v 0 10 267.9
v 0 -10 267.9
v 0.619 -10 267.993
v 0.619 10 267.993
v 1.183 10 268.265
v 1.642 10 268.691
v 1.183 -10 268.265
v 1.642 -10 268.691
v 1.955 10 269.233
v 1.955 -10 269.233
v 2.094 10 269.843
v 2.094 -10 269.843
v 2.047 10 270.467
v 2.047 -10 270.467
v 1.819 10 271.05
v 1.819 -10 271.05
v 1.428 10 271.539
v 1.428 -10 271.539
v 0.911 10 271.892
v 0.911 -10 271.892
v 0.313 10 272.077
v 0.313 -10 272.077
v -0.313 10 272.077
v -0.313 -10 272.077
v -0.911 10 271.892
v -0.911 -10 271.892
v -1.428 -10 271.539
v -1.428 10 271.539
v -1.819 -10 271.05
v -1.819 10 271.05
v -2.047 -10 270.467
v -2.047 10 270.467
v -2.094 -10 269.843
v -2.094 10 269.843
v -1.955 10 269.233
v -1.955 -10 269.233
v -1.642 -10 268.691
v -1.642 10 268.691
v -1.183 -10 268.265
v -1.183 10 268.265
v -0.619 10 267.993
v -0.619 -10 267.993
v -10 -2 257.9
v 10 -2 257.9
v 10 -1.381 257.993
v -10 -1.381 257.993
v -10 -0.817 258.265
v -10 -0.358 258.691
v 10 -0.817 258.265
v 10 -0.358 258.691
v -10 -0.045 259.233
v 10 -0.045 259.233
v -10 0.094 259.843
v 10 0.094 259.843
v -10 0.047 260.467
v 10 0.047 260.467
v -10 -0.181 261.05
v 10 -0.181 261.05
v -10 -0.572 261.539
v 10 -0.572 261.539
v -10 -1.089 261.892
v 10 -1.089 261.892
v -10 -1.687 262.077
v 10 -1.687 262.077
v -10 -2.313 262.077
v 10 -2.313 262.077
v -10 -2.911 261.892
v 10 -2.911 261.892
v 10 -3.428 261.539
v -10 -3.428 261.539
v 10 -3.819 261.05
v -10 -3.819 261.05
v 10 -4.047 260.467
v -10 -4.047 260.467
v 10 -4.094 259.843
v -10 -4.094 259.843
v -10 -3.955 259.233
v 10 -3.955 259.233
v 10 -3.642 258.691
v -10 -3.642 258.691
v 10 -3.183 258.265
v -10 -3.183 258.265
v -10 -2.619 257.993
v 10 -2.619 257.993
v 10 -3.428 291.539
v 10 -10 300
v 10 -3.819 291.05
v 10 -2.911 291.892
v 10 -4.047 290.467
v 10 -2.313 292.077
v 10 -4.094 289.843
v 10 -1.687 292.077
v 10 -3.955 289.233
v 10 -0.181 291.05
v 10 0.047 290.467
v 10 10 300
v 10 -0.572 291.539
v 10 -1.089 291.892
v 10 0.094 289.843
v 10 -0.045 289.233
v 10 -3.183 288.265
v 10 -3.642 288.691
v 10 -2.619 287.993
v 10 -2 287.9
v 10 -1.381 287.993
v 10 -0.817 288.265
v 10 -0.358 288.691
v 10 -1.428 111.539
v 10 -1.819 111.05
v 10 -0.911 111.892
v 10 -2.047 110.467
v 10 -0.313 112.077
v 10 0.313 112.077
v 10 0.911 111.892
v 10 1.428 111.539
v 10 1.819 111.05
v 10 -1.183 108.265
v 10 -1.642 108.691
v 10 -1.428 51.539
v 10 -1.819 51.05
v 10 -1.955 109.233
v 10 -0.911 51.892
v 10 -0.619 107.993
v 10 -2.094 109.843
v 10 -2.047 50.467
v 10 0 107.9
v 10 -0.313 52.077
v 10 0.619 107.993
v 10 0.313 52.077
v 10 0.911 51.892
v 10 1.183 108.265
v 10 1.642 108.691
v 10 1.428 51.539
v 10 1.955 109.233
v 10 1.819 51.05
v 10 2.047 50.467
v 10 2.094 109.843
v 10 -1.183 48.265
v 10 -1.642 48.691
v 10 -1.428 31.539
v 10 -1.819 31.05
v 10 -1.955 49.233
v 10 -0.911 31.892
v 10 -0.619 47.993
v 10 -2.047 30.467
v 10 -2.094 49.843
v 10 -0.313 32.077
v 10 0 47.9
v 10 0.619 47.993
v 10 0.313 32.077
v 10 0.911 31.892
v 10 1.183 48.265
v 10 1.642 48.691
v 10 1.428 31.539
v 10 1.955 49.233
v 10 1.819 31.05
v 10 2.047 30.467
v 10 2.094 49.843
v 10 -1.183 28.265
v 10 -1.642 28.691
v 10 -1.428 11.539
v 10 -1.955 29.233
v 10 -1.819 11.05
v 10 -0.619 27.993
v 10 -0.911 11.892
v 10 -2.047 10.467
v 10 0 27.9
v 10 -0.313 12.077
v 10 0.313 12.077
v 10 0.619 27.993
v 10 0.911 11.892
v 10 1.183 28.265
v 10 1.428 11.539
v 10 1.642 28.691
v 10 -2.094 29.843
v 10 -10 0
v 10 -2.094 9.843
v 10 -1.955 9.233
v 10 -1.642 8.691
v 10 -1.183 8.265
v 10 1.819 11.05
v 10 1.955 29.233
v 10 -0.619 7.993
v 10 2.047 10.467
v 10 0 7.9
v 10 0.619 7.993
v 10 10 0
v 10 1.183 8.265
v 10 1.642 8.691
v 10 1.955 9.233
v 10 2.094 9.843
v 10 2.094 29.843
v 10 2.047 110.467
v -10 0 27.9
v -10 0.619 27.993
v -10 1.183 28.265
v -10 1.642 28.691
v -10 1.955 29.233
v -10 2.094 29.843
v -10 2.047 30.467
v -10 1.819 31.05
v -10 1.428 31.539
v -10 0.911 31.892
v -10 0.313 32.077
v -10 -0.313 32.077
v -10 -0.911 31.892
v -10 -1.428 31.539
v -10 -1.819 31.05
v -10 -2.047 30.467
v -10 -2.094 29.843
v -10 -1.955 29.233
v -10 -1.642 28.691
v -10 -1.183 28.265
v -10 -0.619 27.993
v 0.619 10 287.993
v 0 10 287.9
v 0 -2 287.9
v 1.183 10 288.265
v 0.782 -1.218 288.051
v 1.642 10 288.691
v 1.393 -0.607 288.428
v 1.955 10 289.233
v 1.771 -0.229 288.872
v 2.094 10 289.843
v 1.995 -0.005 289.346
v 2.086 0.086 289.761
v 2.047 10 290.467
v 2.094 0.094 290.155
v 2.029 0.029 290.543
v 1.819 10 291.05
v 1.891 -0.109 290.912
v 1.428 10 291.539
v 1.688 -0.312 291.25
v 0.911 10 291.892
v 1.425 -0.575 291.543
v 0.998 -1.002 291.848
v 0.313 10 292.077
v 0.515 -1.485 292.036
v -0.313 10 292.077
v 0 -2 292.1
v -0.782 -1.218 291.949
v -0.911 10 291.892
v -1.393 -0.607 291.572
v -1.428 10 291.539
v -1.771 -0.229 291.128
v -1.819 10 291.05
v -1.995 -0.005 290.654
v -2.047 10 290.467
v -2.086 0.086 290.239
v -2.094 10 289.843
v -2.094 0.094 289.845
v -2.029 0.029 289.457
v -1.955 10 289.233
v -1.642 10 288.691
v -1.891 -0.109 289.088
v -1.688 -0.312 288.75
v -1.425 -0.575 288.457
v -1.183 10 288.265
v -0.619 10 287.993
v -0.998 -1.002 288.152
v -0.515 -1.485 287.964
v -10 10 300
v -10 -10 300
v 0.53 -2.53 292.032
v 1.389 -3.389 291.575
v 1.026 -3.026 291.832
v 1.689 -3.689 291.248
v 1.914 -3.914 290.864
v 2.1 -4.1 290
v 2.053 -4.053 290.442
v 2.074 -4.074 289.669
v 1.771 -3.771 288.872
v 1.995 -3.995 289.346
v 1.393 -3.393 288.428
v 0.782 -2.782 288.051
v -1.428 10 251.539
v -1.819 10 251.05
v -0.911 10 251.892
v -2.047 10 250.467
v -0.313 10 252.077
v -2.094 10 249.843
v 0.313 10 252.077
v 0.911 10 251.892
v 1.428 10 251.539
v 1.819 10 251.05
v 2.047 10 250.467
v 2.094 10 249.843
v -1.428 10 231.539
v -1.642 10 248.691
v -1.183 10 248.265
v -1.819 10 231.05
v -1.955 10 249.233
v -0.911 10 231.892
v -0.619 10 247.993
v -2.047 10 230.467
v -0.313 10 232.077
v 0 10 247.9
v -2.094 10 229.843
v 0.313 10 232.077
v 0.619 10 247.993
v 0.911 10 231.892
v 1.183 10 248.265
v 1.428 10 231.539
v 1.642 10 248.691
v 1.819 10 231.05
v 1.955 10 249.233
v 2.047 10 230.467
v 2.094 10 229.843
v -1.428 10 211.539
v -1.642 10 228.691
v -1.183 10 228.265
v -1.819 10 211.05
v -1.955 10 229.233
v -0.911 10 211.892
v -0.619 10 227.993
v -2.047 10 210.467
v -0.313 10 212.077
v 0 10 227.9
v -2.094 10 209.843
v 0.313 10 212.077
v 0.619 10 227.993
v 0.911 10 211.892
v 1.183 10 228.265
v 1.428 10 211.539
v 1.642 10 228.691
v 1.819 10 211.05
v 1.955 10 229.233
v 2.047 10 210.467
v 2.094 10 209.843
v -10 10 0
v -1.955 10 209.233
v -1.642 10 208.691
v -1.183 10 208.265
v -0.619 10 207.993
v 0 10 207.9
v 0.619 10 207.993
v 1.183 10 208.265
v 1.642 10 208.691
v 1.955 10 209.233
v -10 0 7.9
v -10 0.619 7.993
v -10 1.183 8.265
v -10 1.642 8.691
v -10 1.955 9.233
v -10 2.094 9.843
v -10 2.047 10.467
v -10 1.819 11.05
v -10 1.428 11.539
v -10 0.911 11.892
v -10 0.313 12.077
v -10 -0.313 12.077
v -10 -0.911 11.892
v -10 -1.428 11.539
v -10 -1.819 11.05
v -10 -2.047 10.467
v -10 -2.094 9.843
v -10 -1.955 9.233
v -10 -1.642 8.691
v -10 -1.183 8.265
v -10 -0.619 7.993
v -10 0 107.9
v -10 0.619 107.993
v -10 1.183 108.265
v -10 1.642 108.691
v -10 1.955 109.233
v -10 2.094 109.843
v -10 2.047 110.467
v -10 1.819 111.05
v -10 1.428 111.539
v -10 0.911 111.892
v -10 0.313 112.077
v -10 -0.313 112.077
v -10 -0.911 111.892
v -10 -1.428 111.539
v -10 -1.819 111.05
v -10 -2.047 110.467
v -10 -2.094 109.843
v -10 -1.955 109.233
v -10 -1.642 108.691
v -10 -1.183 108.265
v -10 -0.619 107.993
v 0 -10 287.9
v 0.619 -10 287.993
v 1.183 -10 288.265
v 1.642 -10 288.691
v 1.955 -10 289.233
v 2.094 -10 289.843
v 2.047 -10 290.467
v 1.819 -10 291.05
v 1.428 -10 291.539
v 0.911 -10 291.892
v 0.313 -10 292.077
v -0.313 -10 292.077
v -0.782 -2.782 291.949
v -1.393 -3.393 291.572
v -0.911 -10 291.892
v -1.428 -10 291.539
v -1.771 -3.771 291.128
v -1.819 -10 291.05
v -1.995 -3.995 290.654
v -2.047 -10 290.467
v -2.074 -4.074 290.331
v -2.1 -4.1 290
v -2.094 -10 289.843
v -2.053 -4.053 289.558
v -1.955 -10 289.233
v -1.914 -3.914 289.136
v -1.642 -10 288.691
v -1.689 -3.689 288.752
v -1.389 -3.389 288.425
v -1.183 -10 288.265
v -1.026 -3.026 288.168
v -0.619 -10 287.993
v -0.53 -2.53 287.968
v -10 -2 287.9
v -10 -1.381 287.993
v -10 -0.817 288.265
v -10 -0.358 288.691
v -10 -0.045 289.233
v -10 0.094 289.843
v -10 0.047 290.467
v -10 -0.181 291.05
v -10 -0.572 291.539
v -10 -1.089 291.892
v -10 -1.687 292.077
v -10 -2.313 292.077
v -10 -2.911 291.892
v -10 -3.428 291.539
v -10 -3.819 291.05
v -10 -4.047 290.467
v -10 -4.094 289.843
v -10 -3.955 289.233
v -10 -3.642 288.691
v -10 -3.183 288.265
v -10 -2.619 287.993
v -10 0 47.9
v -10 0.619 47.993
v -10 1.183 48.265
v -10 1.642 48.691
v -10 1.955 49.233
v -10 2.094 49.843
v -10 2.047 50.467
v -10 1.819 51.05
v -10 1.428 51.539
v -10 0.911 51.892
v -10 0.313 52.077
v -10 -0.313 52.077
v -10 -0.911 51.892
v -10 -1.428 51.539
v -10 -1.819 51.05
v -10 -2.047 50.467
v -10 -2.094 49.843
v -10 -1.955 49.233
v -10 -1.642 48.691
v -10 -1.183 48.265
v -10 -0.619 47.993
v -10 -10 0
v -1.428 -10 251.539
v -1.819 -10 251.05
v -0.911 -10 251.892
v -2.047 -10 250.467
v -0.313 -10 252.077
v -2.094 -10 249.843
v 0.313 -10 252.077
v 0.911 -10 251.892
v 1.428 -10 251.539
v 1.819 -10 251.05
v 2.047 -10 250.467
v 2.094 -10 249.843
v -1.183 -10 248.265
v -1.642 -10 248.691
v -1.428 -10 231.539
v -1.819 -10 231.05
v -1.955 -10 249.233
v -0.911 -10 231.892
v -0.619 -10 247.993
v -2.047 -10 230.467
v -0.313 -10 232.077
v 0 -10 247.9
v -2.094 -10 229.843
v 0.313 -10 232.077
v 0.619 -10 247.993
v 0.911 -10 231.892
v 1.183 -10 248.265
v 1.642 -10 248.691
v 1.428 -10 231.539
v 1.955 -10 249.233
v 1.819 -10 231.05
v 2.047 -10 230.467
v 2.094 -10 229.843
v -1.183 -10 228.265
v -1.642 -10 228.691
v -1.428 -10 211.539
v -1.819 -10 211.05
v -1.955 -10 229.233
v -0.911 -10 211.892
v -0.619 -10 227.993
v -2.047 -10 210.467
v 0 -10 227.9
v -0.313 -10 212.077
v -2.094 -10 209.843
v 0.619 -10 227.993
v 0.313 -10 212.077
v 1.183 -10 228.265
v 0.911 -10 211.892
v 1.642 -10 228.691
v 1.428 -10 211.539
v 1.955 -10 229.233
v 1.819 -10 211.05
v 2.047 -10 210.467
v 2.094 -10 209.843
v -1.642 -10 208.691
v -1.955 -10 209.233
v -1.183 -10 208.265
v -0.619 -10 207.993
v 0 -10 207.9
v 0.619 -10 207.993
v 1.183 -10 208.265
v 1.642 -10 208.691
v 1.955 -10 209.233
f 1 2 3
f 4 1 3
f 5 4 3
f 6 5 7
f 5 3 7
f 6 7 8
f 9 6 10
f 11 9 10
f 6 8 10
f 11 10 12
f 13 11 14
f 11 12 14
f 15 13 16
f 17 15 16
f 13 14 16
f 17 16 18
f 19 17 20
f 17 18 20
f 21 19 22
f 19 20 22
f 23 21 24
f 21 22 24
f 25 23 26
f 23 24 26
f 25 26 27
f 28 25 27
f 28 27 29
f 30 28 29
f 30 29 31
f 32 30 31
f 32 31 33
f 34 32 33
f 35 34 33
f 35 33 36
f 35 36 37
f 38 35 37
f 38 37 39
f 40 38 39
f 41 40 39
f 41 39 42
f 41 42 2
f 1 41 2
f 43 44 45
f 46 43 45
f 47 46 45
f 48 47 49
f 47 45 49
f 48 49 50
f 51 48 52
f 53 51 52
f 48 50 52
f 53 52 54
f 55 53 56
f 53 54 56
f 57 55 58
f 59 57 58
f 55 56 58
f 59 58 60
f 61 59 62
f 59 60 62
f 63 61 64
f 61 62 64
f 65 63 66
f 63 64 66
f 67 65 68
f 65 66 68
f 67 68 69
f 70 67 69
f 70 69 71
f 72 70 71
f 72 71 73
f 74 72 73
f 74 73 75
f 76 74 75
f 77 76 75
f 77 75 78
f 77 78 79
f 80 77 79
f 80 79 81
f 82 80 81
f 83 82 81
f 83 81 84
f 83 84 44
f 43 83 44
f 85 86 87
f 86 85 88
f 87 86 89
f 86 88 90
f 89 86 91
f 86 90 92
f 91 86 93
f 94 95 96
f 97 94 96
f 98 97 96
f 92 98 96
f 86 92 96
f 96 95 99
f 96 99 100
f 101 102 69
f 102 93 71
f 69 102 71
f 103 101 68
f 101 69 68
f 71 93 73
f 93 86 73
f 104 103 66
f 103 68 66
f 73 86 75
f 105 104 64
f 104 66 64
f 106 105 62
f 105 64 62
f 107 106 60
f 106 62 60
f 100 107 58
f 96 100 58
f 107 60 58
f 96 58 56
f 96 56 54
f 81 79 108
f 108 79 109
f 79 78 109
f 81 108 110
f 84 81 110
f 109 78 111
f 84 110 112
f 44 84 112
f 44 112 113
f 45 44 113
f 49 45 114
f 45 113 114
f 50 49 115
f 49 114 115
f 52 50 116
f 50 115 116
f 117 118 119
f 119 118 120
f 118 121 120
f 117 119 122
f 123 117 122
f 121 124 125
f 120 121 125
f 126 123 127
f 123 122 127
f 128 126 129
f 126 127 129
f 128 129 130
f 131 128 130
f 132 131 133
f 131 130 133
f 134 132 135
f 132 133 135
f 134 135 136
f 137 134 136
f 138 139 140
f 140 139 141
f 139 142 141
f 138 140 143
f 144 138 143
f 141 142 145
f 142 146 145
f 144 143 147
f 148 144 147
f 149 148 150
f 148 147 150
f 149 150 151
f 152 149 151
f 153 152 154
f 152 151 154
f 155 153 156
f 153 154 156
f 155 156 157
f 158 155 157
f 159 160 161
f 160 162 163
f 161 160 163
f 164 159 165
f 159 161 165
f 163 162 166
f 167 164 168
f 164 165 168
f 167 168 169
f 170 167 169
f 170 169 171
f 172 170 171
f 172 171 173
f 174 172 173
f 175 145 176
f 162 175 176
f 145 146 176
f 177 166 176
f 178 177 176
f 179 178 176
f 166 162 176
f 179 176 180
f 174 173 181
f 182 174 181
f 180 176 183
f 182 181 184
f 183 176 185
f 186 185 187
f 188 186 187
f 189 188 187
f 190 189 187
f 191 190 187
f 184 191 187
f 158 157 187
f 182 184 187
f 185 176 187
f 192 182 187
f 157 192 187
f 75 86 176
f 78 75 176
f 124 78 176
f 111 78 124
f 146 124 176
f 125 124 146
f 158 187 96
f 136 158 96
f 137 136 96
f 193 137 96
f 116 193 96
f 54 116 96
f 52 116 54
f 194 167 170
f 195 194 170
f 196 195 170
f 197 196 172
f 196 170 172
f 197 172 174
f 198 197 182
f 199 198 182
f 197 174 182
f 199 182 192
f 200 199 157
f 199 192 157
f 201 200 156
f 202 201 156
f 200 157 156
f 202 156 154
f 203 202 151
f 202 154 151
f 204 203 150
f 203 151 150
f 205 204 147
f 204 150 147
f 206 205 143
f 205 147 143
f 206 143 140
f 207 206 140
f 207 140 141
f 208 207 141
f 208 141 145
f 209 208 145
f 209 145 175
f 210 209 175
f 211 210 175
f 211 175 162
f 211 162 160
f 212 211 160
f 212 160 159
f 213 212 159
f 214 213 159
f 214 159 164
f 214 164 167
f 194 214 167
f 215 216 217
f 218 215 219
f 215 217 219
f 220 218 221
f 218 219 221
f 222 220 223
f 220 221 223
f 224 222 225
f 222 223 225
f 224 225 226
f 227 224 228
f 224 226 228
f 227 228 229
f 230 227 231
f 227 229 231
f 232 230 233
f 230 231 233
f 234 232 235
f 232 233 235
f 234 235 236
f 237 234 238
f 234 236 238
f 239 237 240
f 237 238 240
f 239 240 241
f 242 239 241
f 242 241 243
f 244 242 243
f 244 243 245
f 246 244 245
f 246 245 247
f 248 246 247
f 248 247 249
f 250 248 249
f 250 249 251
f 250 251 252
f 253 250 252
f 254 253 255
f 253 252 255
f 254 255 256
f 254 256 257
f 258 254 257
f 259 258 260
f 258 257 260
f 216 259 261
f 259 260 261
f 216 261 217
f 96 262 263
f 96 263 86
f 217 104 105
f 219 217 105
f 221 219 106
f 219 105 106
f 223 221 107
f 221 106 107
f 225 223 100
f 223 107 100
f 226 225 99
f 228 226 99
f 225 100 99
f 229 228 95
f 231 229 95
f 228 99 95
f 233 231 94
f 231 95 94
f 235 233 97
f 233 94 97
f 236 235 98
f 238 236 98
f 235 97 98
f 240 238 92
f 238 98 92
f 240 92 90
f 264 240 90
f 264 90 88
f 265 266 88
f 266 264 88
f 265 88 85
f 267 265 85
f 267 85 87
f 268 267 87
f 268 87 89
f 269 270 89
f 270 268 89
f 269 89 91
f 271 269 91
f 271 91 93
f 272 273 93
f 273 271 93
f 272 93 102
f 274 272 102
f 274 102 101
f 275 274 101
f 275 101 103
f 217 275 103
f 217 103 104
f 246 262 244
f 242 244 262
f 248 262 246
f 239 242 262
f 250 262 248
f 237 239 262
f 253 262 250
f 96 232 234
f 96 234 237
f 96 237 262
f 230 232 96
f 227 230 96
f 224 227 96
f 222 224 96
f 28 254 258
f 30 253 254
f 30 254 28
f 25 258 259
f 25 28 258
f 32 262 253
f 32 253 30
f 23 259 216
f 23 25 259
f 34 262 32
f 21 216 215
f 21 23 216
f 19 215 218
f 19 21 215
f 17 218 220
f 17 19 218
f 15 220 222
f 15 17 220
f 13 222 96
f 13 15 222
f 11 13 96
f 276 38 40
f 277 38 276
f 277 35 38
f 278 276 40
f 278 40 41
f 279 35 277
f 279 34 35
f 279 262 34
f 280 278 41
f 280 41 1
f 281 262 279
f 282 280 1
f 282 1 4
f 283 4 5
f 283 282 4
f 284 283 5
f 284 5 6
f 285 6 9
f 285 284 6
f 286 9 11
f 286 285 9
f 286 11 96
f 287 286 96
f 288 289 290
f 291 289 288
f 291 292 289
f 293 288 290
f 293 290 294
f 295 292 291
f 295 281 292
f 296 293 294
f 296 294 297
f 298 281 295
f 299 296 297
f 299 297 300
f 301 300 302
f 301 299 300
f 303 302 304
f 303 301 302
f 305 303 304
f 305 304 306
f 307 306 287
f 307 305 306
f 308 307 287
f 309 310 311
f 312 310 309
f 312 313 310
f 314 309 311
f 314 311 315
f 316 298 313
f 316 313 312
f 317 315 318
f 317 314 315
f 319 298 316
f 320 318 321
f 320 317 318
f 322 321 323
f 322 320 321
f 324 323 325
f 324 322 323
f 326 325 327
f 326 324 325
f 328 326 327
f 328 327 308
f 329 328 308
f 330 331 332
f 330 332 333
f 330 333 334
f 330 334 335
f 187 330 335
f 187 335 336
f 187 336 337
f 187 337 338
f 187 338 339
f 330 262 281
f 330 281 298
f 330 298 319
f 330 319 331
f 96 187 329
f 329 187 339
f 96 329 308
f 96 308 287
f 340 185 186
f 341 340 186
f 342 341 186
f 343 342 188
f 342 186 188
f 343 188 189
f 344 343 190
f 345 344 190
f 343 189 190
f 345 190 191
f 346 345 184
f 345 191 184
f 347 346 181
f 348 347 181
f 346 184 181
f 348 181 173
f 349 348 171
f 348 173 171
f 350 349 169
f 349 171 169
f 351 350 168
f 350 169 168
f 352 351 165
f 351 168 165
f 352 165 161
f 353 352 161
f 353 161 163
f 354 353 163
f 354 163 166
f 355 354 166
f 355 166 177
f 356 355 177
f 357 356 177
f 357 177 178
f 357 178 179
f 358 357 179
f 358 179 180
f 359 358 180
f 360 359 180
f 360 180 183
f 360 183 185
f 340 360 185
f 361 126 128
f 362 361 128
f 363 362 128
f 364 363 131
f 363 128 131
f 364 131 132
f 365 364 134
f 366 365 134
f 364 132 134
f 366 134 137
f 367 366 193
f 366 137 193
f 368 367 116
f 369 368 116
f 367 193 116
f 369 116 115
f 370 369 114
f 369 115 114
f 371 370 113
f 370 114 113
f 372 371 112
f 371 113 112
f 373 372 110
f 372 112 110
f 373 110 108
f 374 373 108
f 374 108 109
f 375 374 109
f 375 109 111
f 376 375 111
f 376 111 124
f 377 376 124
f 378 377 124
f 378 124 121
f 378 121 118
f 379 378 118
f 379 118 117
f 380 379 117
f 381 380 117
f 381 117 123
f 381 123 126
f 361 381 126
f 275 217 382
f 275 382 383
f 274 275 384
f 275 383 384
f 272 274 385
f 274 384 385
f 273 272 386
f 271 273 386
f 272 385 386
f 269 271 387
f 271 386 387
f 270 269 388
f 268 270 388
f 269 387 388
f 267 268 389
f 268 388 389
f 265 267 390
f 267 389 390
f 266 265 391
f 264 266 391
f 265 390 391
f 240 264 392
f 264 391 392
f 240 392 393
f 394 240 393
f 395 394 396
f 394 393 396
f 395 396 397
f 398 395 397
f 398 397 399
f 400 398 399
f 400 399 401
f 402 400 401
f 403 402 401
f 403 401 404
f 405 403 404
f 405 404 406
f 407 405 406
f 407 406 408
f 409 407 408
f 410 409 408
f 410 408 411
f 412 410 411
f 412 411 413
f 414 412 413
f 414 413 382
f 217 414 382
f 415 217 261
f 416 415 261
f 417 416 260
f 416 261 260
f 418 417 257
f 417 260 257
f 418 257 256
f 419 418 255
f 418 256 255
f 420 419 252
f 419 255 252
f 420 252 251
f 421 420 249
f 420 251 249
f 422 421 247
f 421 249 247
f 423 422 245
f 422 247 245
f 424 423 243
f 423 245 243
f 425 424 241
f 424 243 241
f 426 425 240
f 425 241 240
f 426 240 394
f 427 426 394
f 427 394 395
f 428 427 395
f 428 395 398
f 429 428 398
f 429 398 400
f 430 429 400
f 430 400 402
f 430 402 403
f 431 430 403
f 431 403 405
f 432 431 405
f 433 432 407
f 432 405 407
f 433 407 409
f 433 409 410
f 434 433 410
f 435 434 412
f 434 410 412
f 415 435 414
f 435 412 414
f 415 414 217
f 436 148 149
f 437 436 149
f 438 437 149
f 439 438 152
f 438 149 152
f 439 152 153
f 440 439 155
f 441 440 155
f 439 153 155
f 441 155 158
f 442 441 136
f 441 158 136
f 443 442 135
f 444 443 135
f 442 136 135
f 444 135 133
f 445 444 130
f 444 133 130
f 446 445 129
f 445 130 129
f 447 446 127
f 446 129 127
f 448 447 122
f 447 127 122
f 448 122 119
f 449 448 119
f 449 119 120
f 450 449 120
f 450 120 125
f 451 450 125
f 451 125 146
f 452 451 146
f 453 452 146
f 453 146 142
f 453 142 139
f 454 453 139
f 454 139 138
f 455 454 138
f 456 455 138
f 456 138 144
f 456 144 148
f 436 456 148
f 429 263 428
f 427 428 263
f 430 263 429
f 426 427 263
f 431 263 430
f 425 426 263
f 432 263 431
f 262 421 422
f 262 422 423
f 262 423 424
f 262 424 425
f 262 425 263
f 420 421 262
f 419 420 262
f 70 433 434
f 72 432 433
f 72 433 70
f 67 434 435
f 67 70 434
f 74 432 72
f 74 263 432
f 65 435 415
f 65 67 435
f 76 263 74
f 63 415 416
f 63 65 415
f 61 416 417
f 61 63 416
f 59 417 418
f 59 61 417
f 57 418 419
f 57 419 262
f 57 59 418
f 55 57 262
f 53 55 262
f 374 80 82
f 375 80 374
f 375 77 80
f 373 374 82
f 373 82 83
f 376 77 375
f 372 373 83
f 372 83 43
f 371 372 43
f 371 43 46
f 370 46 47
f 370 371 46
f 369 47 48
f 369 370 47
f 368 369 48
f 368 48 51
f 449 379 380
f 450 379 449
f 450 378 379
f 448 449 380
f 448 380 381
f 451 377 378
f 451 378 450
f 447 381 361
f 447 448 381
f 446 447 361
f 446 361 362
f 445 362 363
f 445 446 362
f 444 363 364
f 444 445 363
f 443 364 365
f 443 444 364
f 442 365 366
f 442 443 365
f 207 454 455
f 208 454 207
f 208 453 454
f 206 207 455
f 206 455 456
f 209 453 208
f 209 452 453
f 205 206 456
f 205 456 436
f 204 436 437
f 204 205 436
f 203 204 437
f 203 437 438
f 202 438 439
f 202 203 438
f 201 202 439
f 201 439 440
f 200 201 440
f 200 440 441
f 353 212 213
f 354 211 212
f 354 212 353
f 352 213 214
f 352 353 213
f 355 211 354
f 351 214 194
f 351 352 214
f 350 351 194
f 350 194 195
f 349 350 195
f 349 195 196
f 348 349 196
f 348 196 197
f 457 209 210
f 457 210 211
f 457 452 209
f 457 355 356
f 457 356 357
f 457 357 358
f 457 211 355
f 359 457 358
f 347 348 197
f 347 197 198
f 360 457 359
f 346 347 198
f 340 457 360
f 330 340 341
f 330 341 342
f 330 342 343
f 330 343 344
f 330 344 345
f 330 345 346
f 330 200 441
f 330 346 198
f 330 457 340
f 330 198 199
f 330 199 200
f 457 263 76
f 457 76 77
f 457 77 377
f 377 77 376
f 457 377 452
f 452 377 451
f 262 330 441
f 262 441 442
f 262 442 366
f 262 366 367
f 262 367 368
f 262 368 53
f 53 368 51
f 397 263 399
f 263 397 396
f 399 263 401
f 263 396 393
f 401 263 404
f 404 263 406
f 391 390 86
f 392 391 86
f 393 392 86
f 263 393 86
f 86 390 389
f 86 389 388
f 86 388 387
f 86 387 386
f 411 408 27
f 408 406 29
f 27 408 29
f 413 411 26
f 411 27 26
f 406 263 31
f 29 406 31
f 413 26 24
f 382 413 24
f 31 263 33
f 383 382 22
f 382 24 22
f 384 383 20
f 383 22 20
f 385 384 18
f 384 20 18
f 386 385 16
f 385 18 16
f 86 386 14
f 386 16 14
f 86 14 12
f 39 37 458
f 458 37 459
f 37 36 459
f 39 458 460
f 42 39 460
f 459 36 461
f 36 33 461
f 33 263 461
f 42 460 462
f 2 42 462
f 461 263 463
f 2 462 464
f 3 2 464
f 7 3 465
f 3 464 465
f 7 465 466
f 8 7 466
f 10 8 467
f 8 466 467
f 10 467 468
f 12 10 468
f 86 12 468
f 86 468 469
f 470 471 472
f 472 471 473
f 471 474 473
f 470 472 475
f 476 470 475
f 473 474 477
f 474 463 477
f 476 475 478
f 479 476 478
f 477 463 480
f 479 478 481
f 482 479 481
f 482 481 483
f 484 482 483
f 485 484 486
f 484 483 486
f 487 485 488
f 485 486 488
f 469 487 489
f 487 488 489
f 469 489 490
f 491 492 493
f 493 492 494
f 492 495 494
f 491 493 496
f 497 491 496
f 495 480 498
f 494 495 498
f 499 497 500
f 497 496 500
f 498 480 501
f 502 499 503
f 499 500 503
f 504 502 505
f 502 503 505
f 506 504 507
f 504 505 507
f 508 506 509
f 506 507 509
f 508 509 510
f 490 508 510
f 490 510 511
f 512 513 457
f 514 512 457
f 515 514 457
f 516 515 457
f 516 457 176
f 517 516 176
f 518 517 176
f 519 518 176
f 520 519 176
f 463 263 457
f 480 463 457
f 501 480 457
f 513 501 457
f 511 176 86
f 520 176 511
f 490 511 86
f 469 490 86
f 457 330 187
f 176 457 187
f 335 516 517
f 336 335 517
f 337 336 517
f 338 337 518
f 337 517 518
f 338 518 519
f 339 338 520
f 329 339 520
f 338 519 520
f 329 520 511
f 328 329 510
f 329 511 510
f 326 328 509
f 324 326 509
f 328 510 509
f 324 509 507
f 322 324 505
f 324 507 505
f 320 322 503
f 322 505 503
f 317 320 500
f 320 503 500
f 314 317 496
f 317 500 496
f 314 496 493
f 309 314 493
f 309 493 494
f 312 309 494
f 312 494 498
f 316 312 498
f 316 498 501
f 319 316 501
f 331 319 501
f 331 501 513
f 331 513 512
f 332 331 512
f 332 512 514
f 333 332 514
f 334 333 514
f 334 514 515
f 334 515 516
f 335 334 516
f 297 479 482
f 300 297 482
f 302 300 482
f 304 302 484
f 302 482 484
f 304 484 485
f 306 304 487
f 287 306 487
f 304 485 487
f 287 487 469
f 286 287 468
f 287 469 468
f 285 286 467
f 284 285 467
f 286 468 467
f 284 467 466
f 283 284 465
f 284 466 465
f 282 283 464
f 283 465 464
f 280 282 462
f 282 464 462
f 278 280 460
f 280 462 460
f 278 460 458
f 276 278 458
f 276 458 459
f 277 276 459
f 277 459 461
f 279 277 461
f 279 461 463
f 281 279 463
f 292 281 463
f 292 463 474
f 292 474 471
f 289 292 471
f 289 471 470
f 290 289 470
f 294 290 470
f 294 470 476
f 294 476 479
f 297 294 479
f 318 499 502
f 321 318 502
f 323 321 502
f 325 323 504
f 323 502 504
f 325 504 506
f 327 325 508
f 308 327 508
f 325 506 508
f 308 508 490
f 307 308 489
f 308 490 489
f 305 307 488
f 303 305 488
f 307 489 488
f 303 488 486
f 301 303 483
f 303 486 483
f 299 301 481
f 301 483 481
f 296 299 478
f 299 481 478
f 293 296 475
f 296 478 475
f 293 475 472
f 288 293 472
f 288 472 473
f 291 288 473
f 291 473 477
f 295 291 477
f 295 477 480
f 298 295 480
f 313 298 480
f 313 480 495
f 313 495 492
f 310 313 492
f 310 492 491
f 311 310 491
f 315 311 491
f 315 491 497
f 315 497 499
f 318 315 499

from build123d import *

# Parameters (mm, degrees)
SKETCH_1_W          = 20
SKETCH_1_H          = 20
EXTRUDE_1_DEPTH     = 300
SKETCH_3_R          = 2.1
CUT_EXTRUDE_1_DEPTH = 301.83217913
SKETCH_4_R          = 2.1
CUT_EXTRUDE_2_DEPTH = 301.83217913
SKETCH_5_R          = 2.1
CUT_EXTRUDE_3_DEPTH = 301.83217913
SKETCH_7_R          = 2.1
CUT_EXTRUDE_4_DEPTH = 301.83217913
SKETCH_8_R          = 2.1
CUT_EXTRUDE_5_DEPTH = 301.83217913


with BuildPart() as part:
    # 草图1 → 凸台-拉伸1 (new body)
    with BuildSketch(Plane.XY):
        Rectangle(SKETCH_1_W, SKETCH_1_H)
    extrude(amount=EXTRUDE_1_DEPTH)

    # 草图3 → 切除-拉伸1 (cut, through all)
    with BuildSketch(Plane(origin=(10, 0, 0), x_dir=(0, 0, -1), z_dir=(1, 0, 0))):
        with Locations((-10, 0)):
            Circle(SKETCH_3_R)
        with Locations((-30, 0)):
            Circle(SKETCH_3_R)
    extrude(amount=-CUT_EXTRUDE_1_DEPTH, mode=Mode.SUBTRACT)

    # 草图4 → 切除-拉伸2 (cut, through all)
    with BuildSketch(Plane(origin=(10, 0, 0), x_dir=(0, 0, -1), z_dir=(1, 0, 0))):
        with Locations((-110, 0)):
            Circle(SKETCH_4_R)
    extrude(amount=-CUT_EXTRUDE_2_DEPTH, mode=Mode.SUBTRACT)

    # 草图5 → 切除-拉伸3 (cut, through all)
    with BuildSketch(Plane(origin=(10, 0, 0), x_dir=(0, 0, -1), z_dir=(1, 0, 0))):
        with Locations((-50, 0)):
            Circle(SKETCH_5_R)
    extrude(amount=-CUT_EXTRUDE_3_DEPTH, mode=Mode.SUBTRACT)

    # 草图7 → 切除-拉伸4 (cut, through all)
    with BuildSketch(Plane.XZ.offset(10)):
        with Locations(Location((0, 290, 0), (0, 0, 270))):
            Circle(SKETCH_7_R)
        with Locations(Location((0, 270, 0), (0, 0, 270))):
            Circle(SKETCH_7_R)
        with Locations(Location((0, 250, 0), (0, 0, 270))):
            Circle(SKETCH_7_R)
        with Locations(Location((0, 230, 0), (0, 0, 270))):
            Circle(SKETCH_7_R)
        with Locations(Location((0, 210, 0), (0, 0, 270))):
            Circle(SKETCH_7_R)
    extrude(amount=-CUT_EXTRUDE_4_DEPTH, mode=Mode.SUBTRACT)

    # 草图8 → 切除-拉伸5 (cut, through all)
    with BuildSketch(Plane(origin=(10, 0, 0), x_dir=(0, 0, -1), z_dir=(1, 0, 0))):
        with Locations((-290, -2)):
            Circle(SKETCH_8_R)
        with Locations((-260, -2)):
            Circle(SKETCH_8_R)
    extrude(amount=-CUT_EXTRUDE_5_DEPTH, mode=Mode.SUBTRACT)


solid = part.part
